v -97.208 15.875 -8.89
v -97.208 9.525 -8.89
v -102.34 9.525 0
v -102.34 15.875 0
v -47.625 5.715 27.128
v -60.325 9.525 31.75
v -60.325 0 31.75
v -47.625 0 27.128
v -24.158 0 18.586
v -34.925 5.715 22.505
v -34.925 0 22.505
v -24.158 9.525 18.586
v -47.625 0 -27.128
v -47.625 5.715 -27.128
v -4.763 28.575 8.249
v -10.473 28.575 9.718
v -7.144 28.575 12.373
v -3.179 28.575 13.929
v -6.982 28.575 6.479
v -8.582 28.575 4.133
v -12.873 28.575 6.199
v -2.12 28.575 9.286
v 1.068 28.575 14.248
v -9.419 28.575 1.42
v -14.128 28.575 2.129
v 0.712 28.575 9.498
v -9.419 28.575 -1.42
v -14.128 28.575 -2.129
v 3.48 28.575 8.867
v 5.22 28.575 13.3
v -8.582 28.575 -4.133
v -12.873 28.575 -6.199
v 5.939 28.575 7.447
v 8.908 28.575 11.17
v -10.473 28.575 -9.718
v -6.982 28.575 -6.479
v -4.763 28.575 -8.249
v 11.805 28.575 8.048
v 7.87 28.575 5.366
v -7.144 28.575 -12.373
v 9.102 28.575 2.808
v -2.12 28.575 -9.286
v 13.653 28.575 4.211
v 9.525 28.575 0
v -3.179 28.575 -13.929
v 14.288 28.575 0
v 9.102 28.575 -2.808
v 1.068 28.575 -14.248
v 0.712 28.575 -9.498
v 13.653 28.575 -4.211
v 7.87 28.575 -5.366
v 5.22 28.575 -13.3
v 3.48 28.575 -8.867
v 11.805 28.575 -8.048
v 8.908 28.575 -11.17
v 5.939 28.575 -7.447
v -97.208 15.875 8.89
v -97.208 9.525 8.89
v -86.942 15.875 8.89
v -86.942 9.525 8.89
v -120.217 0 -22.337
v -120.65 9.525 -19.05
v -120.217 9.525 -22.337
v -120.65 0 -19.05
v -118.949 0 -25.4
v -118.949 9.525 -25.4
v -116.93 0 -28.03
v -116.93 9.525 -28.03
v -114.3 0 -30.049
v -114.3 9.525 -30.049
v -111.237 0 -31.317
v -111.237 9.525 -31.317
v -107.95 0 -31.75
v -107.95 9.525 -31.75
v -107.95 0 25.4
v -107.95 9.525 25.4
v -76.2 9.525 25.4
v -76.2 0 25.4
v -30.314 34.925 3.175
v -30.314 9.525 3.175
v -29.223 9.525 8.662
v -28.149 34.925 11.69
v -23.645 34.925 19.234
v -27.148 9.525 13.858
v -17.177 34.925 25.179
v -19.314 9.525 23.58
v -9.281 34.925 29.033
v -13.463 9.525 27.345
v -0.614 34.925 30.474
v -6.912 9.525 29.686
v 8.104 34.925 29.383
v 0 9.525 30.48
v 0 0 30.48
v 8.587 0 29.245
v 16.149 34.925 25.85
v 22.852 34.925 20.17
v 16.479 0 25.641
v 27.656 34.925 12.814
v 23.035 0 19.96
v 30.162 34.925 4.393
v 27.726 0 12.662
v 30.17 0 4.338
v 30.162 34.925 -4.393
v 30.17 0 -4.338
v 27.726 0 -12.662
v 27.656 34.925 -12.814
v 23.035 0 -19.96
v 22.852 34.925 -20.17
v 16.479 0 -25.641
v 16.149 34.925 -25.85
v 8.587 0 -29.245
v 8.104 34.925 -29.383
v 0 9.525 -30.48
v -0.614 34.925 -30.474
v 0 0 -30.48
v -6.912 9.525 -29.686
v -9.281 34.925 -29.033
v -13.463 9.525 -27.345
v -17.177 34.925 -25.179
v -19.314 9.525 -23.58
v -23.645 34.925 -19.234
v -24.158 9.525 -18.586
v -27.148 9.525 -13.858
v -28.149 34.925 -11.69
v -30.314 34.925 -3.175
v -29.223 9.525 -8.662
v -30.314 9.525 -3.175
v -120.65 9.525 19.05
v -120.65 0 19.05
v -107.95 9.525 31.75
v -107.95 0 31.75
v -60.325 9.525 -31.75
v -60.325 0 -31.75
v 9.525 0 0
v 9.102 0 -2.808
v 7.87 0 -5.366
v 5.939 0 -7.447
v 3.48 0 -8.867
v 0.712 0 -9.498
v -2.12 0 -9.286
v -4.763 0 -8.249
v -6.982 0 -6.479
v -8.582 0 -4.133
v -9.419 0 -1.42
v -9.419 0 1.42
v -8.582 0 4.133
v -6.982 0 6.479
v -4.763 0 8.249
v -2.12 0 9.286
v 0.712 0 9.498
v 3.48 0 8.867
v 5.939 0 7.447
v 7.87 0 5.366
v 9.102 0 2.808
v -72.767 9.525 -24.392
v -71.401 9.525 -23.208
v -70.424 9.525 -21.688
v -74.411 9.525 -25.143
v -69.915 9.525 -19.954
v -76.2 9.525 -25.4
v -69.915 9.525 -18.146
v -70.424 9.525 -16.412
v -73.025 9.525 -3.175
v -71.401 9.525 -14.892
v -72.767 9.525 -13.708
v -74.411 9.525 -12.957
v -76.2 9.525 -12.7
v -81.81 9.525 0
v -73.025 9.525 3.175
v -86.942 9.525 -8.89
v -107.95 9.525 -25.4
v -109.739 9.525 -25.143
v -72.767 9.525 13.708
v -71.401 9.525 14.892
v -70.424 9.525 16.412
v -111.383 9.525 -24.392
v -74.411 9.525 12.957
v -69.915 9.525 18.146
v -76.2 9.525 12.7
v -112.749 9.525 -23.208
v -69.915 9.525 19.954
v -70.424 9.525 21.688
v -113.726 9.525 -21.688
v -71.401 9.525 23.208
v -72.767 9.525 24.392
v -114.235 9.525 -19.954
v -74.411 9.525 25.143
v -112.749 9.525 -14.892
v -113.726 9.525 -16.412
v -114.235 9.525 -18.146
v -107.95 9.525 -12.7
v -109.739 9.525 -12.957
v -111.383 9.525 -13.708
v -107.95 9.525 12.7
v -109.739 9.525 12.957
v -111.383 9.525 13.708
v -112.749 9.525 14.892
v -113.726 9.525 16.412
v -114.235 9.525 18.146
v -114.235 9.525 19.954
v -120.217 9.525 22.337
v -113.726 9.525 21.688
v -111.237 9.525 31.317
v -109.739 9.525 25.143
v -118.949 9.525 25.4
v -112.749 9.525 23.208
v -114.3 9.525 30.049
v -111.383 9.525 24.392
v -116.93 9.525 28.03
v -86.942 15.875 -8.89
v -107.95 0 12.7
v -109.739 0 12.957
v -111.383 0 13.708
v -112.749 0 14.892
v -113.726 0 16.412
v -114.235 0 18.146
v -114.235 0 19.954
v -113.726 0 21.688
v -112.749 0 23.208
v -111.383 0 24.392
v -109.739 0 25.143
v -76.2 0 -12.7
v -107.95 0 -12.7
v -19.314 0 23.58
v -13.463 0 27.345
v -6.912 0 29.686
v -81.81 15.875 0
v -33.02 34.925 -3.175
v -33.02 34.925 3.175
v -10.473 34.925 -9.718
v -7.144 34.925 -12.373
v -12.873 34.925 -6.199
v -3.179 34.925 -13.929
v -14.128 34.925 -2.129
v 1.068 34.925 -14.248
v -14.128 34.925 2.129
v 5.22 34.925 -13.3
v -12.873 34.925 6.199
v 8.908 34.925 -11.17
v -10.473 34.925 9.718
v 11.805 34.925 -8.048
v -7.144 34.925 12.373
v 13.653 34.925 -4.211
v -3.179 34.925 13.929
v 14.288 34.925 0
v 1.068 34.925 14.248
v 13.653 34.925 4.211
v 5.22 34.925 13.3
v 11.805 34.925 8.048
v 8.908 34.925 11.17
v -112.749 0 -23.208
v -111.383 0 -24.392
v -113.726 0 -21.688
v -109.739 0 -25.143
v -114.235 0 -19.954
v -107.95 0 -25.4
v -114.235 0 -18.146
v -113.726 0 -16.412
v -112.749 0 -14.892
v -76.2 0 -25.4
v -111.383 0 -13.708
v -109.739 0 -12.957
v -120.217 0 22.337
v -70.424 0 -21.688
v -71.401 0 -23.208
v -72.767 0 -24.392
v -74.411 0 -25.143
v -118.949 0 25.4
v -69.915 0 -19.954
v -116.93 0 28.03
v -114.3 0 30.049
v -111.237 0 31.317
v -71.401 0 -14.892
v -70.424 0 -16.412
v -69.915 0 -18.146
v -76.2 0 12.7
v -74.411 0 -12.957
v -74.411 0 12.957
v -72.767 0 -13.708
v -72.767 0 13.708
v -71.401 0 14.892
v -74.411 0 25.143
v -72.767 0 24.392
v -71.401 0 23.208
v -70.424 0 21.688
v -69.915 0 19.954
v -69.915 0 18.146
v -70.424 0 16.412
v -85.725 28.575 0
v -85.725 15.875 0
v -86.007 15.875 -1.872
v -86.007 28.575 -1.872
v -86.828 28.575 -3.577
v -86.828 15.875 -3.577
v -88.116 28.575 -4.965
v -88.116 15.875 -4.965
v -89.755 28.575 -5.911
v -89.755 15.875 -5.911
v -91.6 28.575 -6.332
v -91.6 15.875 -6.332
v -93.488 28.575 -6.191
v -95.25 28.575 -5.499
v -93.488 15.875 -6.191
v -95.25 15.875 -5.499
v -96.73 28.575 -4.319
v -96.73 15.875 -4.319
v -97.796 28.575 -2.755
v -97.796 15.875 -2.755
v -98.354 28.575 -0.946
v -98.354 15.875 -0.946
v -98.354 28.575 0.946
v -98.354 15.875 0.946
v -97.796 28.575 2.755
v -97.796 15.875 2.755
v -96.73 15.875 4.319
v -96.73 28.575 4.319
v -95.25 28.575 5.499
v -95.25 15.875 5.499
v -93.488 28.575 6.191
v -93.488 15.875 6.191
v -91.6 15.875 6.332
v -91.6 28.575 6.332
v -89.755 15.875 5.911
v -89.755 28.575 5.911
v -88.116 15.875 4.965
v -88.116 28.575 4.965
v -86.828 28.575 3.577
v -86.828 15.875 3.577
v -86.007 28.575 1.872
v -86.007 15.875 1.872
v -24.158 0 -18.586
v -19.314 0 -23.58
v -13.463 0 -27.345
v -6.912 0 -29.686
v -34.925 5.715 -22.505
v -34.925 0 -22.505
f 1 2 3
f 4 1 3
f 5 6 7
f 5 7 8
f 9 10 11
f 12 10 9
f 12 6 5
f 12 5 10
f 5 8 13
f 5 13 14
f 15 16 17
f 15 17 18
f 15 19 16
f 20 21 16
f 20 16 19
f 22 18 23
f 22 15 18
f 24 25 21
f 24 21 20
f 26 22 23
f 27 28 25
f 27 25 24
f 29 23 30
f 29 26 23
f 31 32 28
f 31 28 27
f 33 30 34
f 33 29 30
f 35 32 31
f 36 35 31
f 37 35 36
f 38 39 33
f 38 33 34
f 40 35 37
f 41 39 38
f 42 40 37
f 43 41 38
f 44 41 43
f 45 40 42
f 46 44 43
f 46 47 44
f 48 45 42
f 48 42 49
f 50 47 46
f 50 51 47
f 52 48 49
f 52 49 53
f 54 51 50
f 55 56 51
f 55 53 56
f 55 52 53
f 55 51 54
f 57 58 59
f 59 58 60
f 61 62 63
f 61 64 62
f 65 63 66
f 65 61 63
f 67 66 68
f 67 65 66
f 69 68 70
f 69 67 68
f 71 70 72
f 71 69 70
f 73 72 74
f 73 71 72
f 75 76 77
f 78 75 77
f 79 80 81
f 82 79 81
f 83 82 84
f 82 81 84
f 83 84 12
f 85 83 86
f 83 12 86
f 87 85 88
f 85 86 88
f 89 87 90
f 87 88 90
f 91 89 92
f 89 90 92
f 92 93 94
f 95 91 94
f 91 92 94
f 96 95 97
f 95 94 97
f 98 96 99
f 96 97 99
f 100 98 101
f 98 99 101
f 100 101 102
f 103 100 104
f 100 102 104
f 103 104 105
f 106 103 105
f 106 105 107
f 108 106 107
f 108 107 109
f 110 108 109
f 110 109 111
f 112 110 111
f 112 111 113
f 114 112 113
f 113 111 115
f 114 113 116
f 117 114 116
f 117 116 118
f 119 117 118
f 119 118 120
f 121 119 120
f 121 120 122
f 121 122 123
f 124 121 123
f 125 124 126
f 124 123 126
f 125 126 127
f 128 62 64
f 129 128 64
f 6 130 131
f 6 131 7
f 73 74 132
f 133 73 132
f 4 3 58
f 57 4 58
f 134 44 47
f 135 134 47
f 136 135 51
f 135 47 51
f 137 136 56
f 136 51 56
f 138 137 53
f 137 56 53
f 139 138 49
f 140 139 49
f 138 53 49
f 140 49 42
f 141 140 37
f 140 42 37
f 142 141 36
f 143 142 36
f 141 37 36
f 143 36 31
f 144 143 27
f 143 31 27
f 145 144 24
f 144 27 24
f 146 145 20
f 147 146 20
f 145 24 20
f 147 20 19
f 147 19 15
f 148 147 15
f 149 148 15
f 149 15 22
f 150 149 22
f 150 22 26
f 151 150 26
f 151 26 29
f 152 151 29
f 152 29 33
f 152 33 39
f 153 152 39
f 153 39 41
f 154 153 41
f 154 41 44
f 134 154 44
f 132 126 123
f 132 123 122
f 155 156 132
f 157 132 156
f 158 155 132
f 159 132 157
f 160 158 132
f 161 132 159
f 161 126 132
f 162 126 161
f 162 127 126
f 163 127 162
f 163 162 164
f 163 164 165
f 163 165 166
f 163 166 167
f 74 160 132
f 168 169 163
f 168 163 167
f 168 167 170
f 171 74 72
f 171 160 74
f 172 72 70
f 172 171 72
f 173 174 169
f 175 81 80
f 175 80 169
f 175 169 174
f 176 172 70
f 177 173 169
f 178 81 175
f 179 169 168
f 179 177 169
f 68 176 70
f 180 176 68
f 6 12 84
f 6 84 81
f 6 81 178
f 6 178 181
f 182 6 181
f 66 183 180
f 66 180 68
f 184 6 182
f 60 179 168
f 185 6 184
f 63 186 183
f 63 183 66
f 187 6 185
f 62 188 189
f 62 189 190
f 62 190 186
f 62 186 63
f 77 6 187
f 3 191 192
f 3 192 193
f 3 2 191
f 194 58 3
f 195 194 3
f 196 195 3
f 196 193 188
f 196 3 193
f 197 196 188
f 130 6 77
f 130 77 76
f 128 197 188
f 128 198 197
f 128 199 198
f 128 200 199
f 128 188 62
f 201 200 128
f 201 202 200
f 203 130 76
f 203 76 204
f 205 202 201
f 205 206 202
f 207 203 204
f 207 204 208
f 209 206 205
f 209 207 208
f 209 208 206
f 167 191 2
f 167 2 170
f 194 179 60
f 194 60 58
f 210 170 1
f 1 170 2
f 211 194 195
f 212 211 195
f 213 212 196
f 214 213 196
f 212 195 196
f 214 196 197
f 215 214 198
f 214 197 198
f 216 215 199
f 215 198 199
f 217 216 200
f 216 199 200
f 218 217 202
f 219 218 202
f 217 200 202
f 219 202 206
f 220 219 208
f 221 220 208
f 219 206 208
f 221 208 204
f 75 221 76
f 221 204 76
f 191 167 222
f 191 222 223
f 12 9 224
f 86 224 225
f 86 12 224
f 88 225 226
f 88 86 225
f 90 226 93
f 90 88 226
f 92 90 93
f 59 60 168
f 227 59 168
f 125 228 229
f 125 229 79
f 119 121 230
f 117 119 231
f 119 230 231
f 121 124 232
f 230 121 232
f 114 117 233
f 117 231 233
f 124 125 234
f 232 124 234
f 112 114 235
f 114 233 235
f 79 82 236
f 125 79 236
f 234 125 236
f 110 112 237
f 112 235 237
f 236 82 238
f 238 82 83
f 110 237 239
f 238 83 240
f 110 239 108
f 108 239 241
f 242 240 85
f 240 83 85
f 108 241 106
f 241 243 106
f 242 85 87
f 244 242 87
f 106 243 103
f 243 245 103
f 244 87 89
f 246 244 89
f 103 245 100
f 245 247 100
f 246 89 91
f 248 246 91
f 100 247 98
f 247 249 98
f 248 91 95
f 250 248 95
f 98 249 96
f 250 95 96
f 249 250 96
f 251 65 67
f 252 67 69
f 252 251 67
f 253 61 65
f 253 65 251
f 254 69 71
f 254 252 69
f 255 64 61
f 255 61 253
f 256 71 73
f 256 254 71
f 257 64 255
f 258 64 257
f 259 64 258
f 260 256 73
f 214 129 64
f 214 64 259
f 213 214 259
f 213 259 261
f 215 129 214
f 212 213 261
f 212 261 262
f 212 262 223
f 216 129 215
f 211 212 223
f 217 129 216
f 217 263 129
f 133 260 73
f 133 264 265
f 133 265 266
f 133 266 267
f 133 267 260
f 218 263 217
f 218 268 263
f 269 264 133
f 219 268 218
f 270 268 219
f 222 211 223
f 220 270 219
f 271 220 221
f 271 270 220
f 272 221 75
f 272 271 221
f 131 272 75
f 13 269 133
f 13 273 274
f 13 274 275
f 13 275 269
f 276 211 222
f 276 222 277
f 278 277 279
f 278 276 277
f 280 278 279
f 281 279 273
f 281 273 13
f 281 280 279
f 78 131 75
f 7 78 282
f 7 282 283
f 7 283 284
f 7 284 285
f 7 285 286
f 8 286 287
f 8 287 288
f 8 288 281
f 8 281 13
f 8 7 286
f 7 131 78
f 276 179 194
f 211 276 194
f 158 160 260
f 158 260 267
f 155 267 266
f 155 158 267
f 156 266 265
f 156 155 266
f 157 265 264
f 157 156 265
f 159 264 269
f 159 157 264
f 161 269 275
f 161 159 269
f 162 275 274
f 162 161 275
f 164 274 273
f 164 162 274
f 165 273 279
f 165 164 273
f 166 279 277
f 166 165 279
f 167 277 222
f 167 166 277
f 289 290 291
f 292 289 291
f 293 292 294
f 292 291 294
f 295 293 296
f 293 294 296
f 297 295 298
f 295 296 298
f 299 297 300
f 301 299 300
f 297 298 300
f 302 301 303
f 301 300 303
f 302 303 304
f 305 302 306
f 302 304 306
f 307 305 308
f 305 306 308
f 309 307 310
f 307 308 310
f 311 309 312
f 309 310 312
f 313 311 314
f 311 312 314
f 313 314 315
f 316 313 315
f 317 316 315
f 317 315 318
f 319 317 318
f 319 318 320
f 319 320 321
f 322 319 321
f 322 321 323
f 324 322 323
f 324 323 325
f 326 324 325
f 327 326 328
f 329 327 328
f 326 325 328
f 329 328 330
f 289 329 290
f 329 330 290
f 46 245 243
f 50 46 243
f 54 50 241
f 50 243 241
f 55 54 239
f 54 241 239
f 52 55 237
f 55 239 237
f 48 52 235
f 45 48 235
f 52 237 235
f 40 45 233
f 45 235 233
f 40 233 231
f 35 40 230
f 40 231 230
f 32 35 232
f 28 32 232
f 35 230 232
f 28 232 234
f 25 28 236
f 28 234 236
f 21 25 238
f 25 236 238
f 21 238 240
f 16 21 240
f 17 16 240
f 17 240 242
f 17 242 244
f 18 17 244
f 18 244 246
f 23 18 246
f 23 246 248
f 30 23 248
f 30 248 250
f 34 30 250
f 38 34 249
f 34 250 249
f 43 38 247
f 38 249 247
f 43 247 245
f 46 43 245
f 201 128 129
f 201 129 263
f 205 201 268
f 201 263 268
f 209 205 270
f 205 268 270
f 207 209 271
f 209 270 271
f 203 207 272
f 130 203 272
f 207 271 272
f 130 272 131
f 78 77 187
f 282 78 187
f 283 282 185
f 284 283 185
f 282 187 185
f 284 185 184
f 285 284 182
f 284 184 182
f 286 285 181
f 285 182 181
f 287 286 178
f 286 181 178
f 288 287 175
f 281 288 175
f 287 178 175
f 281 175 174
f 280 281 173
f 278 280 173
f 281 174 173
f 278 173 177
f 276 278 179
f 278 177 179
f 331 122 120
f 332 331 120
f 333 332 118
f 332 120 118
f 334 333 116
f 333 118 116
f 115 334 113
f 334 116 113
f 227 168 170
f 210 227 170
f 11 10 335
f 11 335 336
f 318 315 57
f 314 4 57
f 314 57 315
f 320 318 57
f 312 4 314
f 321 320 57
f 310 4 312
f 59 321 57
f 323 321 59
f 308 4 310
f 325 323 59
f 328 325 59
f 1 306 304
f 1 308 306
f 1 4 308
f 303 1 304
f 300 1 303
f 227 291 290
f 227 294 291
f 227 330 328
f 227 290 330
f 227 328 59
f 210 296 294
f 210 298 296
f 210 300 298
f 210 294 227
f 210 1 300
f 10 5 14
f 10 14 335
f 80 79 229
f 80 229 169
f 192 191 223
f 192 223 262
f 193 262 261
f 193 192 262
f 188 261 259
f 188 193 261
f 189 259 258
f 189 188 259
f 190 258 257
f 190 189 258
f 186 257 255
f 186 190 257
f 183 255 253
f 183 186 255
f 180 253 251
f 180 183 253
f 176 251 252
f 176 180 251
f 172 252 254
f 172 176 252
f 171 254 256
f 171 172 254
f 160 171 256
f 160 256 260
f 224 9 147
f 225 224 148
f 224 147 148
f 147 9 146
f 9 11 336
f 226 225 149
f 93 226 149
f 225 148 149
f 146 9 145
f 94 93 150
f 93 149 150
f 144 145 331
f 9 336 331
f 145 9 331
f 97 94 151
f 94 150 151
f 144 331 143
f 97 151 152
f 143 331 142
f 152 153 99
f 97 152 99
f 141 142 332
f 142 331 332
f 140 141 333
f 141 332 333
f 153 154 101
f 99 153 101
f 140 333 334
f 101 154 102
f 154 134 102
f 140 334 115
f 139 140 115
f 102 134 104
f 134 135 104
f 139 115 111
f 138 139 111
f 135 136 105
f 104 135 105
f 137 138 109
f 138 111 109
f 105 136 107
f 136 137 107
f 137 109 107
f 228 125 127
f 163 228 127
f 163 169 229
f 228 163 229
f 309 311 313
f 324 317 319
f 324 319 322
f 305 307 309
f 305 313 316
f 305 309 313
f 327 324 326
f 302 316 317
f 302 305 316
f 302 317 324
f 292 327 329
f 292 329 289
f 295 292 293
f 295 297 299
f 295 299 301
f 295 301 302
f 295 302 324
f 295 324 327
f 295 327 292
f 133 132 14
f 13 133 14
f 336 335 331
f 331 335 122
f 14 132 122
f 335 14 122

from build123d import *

# Parameters (mm, degrees)
BOSS_EXTRUDE1_DEPTH = 31.75
FILLET1_R           = 12.7
CUT_EXTRUDE1_DEPTH  = 63.5
SKETCH5_R           = 30.48
BOSS_EXTRUDE2_DEPTH = 34.925
SKETCH6_R           = 9.525
CUT_EXTRUDE2_DEPTH  = 35.925
SKETCH7_R           = 14.2875
CUT_EXTRUDE3_DEPTH  = 6.35
CUT_EXTRUDE4_DEPTH  = 10.525
BOSS_EXTRUDE6_DEPTH = 3.175
BOSS_EXTRUDE7_DEPTH = 6.35
SKETCH11_R          = 6.35
BOSS_EXTRUDE8_DEPTH = 12.7


with BuildPart() as part:
    # Sketch2 → Boss-Extrude1 (new body, symmetric)
    with BuildSketch(Plane.XY):
        Polygon((0, 0), (0, 9.525), (-120.65, 9.525), (-120.65, 0), (-47.625, 0), (-47.625, 5.715), (-34.925, 5.715), (-34.925, 0), align=None)
    extrude(amount=BOSS_EXTRUDE1_DEPTH, both=True)

    # Fillet1
    fillet1_edges = [part.edges().sort_by_distance(p)[0] for p in [
        (-120.65, 4.7625, -31.75),
        (-120.65, 4.7625, 31.75),
    ]]
    fillet(fillet1_edges, radius=FILLET1_R)

    # Sketch3 → Cut-Extrude1 (cut)
    with BuildSketch(Plane(origin=(0, 9.525, 0), x_dir=(1, 0, 0), z_dir=(0, 1, 0))):
        with BuildLine():
            Line((-107.95, 25.4), (-76.2, 25.4))
            ThreePointArc((-76.2, 25.4), (-69.85, 19.05), (-76.2, 12.7))
            Line((-76.2, 12.7), (-107.95, 12.7))
            ThreePointArc((-107.95, 12.7), (-114.3, 19.05), (-107.95, 25.4))
        make_face()
        with BuildLine():
            Line((-107.95, -25.4), (-76.2, -25.4))
            ThreePointArc((-76.2, -25.4), (-69.85, -19.05), (-76.2, -12.7))
            Line((-76.2, -12.7), (-107.95, -12.7))
            ThreePointArc((-107.95, -12.7), (-114.3, -19.05), (-107.95, -25.4))
        make_face()
    extrude(amount=-CUT_EXTRUDE1_DEPTH, mode=Mode.SUBTRACT)

    # Sketch5 → Boss-Extrude2 (add)
    with BuildSketch(Plane(origin=(0, 0, 0), x_dir=(1, 0, 0), z_dir=(0, 1, 0))):
        Circle(SKETCH5_R)
    extrude(amount=BOSS_EXTRUDE2_DEPTH)

    # Sketch6 → Cut-Extrude2 (cut, through all)
    with BuildSketch(Plane(origin=(0, 34.925, 0), x_dir=(1, 0, 0), z_dir=(0, 1, 0))):
        Circle(SKETCH6_R)
    extrude(amount=-CUT_EXTRUDE2_DEPTH, mode=Mode.SUBTRACT)

    # Sketch7 → Cut-Extrude3 (cut)
    with BuildSketch(Plane(origin=(0, 34.925, 0), x_dir=(1, 0, 0), z_dir=(0, 1, 0))):
        Circle(SKETCH7_R)
    extrude(amount=-CUT_EXTRUDE3_DEPTH, mode=Mode.SUBTRACT)

    # Sketch8 → Cut-Extrude4 (cut, through all)
    with BuildSketch(Plane(origin=(0, 9.525, 0), x_dir=(1, 0, 0), z_dir=(0, 1, 0))):
        with BuildLine():
            Line((-60.325, 31.75), (-24.157536171, 18.586119717))
            ThreePointArc((-24.157536171, 18.586119717), (-13.463384994, 27.345340819), (0, 30.48))
            Line((0, 30.48), (0, 31.75))
            Line((0, 31.75), (-60.325, 31.75))
        make_face()
        with BuildLine():
            Line((0, -31.75), (-60.325, -31.75))
            Line((-60.325, -31.75), (-24.157536171, -18.586119717))
            ThreePointArc((-24.157536171, -18.586119717), (-13.463384994, -27.345340819), (0, -30.48))
            Line((0, -30.48), (0, -31.75))
        make_face()
    extrude(amount=-CUT_EXTRUDE4_DEPTH, mode=Mode.SUBTRACT)

    # Sketch9 → Boss-Extrude6 (add, symmetric)
    with BuildSketch(Plane.XY):
        Polygon((-73.025, 9.525), (-33.02, 34.925), (-28.575, 34.925), (-28.575, 9.525), align=None)
    extrude(amount=BOSS_EXTRUDE6_DEPTH, both=True)

    # Sketch10 → Boss-Extrude7 (add)
    with BuildSketch(Plane(origin=(0, 9.525, 0), x_dir=(1, 0, 0), z_dir=(0, 1, 0))):
        Polygon((-81.809712214, 0), (-86.942356107, 8.89), (-97.207643893, 8.89), (-102.340287786, 0), (-97.207643893, -8.89), (-86.942356107, -8.89), align=None)
    extrude(amount=BOSS_EXTRUDE7_DEPTH)

    # Sketch11 → Boss-Extrude8 (add)
    with BuildSketch(Plane(origin=(0, 15.875, 0), x_dir=(1, 0, 0), z_dir=(0, 1, 0))):
        with Locations((-92.075, 0)):
            Circle(SKETCH11_R)
    extrude(amount=BOSS_EXTRUDE8_DEPTH)


solid = part.part
